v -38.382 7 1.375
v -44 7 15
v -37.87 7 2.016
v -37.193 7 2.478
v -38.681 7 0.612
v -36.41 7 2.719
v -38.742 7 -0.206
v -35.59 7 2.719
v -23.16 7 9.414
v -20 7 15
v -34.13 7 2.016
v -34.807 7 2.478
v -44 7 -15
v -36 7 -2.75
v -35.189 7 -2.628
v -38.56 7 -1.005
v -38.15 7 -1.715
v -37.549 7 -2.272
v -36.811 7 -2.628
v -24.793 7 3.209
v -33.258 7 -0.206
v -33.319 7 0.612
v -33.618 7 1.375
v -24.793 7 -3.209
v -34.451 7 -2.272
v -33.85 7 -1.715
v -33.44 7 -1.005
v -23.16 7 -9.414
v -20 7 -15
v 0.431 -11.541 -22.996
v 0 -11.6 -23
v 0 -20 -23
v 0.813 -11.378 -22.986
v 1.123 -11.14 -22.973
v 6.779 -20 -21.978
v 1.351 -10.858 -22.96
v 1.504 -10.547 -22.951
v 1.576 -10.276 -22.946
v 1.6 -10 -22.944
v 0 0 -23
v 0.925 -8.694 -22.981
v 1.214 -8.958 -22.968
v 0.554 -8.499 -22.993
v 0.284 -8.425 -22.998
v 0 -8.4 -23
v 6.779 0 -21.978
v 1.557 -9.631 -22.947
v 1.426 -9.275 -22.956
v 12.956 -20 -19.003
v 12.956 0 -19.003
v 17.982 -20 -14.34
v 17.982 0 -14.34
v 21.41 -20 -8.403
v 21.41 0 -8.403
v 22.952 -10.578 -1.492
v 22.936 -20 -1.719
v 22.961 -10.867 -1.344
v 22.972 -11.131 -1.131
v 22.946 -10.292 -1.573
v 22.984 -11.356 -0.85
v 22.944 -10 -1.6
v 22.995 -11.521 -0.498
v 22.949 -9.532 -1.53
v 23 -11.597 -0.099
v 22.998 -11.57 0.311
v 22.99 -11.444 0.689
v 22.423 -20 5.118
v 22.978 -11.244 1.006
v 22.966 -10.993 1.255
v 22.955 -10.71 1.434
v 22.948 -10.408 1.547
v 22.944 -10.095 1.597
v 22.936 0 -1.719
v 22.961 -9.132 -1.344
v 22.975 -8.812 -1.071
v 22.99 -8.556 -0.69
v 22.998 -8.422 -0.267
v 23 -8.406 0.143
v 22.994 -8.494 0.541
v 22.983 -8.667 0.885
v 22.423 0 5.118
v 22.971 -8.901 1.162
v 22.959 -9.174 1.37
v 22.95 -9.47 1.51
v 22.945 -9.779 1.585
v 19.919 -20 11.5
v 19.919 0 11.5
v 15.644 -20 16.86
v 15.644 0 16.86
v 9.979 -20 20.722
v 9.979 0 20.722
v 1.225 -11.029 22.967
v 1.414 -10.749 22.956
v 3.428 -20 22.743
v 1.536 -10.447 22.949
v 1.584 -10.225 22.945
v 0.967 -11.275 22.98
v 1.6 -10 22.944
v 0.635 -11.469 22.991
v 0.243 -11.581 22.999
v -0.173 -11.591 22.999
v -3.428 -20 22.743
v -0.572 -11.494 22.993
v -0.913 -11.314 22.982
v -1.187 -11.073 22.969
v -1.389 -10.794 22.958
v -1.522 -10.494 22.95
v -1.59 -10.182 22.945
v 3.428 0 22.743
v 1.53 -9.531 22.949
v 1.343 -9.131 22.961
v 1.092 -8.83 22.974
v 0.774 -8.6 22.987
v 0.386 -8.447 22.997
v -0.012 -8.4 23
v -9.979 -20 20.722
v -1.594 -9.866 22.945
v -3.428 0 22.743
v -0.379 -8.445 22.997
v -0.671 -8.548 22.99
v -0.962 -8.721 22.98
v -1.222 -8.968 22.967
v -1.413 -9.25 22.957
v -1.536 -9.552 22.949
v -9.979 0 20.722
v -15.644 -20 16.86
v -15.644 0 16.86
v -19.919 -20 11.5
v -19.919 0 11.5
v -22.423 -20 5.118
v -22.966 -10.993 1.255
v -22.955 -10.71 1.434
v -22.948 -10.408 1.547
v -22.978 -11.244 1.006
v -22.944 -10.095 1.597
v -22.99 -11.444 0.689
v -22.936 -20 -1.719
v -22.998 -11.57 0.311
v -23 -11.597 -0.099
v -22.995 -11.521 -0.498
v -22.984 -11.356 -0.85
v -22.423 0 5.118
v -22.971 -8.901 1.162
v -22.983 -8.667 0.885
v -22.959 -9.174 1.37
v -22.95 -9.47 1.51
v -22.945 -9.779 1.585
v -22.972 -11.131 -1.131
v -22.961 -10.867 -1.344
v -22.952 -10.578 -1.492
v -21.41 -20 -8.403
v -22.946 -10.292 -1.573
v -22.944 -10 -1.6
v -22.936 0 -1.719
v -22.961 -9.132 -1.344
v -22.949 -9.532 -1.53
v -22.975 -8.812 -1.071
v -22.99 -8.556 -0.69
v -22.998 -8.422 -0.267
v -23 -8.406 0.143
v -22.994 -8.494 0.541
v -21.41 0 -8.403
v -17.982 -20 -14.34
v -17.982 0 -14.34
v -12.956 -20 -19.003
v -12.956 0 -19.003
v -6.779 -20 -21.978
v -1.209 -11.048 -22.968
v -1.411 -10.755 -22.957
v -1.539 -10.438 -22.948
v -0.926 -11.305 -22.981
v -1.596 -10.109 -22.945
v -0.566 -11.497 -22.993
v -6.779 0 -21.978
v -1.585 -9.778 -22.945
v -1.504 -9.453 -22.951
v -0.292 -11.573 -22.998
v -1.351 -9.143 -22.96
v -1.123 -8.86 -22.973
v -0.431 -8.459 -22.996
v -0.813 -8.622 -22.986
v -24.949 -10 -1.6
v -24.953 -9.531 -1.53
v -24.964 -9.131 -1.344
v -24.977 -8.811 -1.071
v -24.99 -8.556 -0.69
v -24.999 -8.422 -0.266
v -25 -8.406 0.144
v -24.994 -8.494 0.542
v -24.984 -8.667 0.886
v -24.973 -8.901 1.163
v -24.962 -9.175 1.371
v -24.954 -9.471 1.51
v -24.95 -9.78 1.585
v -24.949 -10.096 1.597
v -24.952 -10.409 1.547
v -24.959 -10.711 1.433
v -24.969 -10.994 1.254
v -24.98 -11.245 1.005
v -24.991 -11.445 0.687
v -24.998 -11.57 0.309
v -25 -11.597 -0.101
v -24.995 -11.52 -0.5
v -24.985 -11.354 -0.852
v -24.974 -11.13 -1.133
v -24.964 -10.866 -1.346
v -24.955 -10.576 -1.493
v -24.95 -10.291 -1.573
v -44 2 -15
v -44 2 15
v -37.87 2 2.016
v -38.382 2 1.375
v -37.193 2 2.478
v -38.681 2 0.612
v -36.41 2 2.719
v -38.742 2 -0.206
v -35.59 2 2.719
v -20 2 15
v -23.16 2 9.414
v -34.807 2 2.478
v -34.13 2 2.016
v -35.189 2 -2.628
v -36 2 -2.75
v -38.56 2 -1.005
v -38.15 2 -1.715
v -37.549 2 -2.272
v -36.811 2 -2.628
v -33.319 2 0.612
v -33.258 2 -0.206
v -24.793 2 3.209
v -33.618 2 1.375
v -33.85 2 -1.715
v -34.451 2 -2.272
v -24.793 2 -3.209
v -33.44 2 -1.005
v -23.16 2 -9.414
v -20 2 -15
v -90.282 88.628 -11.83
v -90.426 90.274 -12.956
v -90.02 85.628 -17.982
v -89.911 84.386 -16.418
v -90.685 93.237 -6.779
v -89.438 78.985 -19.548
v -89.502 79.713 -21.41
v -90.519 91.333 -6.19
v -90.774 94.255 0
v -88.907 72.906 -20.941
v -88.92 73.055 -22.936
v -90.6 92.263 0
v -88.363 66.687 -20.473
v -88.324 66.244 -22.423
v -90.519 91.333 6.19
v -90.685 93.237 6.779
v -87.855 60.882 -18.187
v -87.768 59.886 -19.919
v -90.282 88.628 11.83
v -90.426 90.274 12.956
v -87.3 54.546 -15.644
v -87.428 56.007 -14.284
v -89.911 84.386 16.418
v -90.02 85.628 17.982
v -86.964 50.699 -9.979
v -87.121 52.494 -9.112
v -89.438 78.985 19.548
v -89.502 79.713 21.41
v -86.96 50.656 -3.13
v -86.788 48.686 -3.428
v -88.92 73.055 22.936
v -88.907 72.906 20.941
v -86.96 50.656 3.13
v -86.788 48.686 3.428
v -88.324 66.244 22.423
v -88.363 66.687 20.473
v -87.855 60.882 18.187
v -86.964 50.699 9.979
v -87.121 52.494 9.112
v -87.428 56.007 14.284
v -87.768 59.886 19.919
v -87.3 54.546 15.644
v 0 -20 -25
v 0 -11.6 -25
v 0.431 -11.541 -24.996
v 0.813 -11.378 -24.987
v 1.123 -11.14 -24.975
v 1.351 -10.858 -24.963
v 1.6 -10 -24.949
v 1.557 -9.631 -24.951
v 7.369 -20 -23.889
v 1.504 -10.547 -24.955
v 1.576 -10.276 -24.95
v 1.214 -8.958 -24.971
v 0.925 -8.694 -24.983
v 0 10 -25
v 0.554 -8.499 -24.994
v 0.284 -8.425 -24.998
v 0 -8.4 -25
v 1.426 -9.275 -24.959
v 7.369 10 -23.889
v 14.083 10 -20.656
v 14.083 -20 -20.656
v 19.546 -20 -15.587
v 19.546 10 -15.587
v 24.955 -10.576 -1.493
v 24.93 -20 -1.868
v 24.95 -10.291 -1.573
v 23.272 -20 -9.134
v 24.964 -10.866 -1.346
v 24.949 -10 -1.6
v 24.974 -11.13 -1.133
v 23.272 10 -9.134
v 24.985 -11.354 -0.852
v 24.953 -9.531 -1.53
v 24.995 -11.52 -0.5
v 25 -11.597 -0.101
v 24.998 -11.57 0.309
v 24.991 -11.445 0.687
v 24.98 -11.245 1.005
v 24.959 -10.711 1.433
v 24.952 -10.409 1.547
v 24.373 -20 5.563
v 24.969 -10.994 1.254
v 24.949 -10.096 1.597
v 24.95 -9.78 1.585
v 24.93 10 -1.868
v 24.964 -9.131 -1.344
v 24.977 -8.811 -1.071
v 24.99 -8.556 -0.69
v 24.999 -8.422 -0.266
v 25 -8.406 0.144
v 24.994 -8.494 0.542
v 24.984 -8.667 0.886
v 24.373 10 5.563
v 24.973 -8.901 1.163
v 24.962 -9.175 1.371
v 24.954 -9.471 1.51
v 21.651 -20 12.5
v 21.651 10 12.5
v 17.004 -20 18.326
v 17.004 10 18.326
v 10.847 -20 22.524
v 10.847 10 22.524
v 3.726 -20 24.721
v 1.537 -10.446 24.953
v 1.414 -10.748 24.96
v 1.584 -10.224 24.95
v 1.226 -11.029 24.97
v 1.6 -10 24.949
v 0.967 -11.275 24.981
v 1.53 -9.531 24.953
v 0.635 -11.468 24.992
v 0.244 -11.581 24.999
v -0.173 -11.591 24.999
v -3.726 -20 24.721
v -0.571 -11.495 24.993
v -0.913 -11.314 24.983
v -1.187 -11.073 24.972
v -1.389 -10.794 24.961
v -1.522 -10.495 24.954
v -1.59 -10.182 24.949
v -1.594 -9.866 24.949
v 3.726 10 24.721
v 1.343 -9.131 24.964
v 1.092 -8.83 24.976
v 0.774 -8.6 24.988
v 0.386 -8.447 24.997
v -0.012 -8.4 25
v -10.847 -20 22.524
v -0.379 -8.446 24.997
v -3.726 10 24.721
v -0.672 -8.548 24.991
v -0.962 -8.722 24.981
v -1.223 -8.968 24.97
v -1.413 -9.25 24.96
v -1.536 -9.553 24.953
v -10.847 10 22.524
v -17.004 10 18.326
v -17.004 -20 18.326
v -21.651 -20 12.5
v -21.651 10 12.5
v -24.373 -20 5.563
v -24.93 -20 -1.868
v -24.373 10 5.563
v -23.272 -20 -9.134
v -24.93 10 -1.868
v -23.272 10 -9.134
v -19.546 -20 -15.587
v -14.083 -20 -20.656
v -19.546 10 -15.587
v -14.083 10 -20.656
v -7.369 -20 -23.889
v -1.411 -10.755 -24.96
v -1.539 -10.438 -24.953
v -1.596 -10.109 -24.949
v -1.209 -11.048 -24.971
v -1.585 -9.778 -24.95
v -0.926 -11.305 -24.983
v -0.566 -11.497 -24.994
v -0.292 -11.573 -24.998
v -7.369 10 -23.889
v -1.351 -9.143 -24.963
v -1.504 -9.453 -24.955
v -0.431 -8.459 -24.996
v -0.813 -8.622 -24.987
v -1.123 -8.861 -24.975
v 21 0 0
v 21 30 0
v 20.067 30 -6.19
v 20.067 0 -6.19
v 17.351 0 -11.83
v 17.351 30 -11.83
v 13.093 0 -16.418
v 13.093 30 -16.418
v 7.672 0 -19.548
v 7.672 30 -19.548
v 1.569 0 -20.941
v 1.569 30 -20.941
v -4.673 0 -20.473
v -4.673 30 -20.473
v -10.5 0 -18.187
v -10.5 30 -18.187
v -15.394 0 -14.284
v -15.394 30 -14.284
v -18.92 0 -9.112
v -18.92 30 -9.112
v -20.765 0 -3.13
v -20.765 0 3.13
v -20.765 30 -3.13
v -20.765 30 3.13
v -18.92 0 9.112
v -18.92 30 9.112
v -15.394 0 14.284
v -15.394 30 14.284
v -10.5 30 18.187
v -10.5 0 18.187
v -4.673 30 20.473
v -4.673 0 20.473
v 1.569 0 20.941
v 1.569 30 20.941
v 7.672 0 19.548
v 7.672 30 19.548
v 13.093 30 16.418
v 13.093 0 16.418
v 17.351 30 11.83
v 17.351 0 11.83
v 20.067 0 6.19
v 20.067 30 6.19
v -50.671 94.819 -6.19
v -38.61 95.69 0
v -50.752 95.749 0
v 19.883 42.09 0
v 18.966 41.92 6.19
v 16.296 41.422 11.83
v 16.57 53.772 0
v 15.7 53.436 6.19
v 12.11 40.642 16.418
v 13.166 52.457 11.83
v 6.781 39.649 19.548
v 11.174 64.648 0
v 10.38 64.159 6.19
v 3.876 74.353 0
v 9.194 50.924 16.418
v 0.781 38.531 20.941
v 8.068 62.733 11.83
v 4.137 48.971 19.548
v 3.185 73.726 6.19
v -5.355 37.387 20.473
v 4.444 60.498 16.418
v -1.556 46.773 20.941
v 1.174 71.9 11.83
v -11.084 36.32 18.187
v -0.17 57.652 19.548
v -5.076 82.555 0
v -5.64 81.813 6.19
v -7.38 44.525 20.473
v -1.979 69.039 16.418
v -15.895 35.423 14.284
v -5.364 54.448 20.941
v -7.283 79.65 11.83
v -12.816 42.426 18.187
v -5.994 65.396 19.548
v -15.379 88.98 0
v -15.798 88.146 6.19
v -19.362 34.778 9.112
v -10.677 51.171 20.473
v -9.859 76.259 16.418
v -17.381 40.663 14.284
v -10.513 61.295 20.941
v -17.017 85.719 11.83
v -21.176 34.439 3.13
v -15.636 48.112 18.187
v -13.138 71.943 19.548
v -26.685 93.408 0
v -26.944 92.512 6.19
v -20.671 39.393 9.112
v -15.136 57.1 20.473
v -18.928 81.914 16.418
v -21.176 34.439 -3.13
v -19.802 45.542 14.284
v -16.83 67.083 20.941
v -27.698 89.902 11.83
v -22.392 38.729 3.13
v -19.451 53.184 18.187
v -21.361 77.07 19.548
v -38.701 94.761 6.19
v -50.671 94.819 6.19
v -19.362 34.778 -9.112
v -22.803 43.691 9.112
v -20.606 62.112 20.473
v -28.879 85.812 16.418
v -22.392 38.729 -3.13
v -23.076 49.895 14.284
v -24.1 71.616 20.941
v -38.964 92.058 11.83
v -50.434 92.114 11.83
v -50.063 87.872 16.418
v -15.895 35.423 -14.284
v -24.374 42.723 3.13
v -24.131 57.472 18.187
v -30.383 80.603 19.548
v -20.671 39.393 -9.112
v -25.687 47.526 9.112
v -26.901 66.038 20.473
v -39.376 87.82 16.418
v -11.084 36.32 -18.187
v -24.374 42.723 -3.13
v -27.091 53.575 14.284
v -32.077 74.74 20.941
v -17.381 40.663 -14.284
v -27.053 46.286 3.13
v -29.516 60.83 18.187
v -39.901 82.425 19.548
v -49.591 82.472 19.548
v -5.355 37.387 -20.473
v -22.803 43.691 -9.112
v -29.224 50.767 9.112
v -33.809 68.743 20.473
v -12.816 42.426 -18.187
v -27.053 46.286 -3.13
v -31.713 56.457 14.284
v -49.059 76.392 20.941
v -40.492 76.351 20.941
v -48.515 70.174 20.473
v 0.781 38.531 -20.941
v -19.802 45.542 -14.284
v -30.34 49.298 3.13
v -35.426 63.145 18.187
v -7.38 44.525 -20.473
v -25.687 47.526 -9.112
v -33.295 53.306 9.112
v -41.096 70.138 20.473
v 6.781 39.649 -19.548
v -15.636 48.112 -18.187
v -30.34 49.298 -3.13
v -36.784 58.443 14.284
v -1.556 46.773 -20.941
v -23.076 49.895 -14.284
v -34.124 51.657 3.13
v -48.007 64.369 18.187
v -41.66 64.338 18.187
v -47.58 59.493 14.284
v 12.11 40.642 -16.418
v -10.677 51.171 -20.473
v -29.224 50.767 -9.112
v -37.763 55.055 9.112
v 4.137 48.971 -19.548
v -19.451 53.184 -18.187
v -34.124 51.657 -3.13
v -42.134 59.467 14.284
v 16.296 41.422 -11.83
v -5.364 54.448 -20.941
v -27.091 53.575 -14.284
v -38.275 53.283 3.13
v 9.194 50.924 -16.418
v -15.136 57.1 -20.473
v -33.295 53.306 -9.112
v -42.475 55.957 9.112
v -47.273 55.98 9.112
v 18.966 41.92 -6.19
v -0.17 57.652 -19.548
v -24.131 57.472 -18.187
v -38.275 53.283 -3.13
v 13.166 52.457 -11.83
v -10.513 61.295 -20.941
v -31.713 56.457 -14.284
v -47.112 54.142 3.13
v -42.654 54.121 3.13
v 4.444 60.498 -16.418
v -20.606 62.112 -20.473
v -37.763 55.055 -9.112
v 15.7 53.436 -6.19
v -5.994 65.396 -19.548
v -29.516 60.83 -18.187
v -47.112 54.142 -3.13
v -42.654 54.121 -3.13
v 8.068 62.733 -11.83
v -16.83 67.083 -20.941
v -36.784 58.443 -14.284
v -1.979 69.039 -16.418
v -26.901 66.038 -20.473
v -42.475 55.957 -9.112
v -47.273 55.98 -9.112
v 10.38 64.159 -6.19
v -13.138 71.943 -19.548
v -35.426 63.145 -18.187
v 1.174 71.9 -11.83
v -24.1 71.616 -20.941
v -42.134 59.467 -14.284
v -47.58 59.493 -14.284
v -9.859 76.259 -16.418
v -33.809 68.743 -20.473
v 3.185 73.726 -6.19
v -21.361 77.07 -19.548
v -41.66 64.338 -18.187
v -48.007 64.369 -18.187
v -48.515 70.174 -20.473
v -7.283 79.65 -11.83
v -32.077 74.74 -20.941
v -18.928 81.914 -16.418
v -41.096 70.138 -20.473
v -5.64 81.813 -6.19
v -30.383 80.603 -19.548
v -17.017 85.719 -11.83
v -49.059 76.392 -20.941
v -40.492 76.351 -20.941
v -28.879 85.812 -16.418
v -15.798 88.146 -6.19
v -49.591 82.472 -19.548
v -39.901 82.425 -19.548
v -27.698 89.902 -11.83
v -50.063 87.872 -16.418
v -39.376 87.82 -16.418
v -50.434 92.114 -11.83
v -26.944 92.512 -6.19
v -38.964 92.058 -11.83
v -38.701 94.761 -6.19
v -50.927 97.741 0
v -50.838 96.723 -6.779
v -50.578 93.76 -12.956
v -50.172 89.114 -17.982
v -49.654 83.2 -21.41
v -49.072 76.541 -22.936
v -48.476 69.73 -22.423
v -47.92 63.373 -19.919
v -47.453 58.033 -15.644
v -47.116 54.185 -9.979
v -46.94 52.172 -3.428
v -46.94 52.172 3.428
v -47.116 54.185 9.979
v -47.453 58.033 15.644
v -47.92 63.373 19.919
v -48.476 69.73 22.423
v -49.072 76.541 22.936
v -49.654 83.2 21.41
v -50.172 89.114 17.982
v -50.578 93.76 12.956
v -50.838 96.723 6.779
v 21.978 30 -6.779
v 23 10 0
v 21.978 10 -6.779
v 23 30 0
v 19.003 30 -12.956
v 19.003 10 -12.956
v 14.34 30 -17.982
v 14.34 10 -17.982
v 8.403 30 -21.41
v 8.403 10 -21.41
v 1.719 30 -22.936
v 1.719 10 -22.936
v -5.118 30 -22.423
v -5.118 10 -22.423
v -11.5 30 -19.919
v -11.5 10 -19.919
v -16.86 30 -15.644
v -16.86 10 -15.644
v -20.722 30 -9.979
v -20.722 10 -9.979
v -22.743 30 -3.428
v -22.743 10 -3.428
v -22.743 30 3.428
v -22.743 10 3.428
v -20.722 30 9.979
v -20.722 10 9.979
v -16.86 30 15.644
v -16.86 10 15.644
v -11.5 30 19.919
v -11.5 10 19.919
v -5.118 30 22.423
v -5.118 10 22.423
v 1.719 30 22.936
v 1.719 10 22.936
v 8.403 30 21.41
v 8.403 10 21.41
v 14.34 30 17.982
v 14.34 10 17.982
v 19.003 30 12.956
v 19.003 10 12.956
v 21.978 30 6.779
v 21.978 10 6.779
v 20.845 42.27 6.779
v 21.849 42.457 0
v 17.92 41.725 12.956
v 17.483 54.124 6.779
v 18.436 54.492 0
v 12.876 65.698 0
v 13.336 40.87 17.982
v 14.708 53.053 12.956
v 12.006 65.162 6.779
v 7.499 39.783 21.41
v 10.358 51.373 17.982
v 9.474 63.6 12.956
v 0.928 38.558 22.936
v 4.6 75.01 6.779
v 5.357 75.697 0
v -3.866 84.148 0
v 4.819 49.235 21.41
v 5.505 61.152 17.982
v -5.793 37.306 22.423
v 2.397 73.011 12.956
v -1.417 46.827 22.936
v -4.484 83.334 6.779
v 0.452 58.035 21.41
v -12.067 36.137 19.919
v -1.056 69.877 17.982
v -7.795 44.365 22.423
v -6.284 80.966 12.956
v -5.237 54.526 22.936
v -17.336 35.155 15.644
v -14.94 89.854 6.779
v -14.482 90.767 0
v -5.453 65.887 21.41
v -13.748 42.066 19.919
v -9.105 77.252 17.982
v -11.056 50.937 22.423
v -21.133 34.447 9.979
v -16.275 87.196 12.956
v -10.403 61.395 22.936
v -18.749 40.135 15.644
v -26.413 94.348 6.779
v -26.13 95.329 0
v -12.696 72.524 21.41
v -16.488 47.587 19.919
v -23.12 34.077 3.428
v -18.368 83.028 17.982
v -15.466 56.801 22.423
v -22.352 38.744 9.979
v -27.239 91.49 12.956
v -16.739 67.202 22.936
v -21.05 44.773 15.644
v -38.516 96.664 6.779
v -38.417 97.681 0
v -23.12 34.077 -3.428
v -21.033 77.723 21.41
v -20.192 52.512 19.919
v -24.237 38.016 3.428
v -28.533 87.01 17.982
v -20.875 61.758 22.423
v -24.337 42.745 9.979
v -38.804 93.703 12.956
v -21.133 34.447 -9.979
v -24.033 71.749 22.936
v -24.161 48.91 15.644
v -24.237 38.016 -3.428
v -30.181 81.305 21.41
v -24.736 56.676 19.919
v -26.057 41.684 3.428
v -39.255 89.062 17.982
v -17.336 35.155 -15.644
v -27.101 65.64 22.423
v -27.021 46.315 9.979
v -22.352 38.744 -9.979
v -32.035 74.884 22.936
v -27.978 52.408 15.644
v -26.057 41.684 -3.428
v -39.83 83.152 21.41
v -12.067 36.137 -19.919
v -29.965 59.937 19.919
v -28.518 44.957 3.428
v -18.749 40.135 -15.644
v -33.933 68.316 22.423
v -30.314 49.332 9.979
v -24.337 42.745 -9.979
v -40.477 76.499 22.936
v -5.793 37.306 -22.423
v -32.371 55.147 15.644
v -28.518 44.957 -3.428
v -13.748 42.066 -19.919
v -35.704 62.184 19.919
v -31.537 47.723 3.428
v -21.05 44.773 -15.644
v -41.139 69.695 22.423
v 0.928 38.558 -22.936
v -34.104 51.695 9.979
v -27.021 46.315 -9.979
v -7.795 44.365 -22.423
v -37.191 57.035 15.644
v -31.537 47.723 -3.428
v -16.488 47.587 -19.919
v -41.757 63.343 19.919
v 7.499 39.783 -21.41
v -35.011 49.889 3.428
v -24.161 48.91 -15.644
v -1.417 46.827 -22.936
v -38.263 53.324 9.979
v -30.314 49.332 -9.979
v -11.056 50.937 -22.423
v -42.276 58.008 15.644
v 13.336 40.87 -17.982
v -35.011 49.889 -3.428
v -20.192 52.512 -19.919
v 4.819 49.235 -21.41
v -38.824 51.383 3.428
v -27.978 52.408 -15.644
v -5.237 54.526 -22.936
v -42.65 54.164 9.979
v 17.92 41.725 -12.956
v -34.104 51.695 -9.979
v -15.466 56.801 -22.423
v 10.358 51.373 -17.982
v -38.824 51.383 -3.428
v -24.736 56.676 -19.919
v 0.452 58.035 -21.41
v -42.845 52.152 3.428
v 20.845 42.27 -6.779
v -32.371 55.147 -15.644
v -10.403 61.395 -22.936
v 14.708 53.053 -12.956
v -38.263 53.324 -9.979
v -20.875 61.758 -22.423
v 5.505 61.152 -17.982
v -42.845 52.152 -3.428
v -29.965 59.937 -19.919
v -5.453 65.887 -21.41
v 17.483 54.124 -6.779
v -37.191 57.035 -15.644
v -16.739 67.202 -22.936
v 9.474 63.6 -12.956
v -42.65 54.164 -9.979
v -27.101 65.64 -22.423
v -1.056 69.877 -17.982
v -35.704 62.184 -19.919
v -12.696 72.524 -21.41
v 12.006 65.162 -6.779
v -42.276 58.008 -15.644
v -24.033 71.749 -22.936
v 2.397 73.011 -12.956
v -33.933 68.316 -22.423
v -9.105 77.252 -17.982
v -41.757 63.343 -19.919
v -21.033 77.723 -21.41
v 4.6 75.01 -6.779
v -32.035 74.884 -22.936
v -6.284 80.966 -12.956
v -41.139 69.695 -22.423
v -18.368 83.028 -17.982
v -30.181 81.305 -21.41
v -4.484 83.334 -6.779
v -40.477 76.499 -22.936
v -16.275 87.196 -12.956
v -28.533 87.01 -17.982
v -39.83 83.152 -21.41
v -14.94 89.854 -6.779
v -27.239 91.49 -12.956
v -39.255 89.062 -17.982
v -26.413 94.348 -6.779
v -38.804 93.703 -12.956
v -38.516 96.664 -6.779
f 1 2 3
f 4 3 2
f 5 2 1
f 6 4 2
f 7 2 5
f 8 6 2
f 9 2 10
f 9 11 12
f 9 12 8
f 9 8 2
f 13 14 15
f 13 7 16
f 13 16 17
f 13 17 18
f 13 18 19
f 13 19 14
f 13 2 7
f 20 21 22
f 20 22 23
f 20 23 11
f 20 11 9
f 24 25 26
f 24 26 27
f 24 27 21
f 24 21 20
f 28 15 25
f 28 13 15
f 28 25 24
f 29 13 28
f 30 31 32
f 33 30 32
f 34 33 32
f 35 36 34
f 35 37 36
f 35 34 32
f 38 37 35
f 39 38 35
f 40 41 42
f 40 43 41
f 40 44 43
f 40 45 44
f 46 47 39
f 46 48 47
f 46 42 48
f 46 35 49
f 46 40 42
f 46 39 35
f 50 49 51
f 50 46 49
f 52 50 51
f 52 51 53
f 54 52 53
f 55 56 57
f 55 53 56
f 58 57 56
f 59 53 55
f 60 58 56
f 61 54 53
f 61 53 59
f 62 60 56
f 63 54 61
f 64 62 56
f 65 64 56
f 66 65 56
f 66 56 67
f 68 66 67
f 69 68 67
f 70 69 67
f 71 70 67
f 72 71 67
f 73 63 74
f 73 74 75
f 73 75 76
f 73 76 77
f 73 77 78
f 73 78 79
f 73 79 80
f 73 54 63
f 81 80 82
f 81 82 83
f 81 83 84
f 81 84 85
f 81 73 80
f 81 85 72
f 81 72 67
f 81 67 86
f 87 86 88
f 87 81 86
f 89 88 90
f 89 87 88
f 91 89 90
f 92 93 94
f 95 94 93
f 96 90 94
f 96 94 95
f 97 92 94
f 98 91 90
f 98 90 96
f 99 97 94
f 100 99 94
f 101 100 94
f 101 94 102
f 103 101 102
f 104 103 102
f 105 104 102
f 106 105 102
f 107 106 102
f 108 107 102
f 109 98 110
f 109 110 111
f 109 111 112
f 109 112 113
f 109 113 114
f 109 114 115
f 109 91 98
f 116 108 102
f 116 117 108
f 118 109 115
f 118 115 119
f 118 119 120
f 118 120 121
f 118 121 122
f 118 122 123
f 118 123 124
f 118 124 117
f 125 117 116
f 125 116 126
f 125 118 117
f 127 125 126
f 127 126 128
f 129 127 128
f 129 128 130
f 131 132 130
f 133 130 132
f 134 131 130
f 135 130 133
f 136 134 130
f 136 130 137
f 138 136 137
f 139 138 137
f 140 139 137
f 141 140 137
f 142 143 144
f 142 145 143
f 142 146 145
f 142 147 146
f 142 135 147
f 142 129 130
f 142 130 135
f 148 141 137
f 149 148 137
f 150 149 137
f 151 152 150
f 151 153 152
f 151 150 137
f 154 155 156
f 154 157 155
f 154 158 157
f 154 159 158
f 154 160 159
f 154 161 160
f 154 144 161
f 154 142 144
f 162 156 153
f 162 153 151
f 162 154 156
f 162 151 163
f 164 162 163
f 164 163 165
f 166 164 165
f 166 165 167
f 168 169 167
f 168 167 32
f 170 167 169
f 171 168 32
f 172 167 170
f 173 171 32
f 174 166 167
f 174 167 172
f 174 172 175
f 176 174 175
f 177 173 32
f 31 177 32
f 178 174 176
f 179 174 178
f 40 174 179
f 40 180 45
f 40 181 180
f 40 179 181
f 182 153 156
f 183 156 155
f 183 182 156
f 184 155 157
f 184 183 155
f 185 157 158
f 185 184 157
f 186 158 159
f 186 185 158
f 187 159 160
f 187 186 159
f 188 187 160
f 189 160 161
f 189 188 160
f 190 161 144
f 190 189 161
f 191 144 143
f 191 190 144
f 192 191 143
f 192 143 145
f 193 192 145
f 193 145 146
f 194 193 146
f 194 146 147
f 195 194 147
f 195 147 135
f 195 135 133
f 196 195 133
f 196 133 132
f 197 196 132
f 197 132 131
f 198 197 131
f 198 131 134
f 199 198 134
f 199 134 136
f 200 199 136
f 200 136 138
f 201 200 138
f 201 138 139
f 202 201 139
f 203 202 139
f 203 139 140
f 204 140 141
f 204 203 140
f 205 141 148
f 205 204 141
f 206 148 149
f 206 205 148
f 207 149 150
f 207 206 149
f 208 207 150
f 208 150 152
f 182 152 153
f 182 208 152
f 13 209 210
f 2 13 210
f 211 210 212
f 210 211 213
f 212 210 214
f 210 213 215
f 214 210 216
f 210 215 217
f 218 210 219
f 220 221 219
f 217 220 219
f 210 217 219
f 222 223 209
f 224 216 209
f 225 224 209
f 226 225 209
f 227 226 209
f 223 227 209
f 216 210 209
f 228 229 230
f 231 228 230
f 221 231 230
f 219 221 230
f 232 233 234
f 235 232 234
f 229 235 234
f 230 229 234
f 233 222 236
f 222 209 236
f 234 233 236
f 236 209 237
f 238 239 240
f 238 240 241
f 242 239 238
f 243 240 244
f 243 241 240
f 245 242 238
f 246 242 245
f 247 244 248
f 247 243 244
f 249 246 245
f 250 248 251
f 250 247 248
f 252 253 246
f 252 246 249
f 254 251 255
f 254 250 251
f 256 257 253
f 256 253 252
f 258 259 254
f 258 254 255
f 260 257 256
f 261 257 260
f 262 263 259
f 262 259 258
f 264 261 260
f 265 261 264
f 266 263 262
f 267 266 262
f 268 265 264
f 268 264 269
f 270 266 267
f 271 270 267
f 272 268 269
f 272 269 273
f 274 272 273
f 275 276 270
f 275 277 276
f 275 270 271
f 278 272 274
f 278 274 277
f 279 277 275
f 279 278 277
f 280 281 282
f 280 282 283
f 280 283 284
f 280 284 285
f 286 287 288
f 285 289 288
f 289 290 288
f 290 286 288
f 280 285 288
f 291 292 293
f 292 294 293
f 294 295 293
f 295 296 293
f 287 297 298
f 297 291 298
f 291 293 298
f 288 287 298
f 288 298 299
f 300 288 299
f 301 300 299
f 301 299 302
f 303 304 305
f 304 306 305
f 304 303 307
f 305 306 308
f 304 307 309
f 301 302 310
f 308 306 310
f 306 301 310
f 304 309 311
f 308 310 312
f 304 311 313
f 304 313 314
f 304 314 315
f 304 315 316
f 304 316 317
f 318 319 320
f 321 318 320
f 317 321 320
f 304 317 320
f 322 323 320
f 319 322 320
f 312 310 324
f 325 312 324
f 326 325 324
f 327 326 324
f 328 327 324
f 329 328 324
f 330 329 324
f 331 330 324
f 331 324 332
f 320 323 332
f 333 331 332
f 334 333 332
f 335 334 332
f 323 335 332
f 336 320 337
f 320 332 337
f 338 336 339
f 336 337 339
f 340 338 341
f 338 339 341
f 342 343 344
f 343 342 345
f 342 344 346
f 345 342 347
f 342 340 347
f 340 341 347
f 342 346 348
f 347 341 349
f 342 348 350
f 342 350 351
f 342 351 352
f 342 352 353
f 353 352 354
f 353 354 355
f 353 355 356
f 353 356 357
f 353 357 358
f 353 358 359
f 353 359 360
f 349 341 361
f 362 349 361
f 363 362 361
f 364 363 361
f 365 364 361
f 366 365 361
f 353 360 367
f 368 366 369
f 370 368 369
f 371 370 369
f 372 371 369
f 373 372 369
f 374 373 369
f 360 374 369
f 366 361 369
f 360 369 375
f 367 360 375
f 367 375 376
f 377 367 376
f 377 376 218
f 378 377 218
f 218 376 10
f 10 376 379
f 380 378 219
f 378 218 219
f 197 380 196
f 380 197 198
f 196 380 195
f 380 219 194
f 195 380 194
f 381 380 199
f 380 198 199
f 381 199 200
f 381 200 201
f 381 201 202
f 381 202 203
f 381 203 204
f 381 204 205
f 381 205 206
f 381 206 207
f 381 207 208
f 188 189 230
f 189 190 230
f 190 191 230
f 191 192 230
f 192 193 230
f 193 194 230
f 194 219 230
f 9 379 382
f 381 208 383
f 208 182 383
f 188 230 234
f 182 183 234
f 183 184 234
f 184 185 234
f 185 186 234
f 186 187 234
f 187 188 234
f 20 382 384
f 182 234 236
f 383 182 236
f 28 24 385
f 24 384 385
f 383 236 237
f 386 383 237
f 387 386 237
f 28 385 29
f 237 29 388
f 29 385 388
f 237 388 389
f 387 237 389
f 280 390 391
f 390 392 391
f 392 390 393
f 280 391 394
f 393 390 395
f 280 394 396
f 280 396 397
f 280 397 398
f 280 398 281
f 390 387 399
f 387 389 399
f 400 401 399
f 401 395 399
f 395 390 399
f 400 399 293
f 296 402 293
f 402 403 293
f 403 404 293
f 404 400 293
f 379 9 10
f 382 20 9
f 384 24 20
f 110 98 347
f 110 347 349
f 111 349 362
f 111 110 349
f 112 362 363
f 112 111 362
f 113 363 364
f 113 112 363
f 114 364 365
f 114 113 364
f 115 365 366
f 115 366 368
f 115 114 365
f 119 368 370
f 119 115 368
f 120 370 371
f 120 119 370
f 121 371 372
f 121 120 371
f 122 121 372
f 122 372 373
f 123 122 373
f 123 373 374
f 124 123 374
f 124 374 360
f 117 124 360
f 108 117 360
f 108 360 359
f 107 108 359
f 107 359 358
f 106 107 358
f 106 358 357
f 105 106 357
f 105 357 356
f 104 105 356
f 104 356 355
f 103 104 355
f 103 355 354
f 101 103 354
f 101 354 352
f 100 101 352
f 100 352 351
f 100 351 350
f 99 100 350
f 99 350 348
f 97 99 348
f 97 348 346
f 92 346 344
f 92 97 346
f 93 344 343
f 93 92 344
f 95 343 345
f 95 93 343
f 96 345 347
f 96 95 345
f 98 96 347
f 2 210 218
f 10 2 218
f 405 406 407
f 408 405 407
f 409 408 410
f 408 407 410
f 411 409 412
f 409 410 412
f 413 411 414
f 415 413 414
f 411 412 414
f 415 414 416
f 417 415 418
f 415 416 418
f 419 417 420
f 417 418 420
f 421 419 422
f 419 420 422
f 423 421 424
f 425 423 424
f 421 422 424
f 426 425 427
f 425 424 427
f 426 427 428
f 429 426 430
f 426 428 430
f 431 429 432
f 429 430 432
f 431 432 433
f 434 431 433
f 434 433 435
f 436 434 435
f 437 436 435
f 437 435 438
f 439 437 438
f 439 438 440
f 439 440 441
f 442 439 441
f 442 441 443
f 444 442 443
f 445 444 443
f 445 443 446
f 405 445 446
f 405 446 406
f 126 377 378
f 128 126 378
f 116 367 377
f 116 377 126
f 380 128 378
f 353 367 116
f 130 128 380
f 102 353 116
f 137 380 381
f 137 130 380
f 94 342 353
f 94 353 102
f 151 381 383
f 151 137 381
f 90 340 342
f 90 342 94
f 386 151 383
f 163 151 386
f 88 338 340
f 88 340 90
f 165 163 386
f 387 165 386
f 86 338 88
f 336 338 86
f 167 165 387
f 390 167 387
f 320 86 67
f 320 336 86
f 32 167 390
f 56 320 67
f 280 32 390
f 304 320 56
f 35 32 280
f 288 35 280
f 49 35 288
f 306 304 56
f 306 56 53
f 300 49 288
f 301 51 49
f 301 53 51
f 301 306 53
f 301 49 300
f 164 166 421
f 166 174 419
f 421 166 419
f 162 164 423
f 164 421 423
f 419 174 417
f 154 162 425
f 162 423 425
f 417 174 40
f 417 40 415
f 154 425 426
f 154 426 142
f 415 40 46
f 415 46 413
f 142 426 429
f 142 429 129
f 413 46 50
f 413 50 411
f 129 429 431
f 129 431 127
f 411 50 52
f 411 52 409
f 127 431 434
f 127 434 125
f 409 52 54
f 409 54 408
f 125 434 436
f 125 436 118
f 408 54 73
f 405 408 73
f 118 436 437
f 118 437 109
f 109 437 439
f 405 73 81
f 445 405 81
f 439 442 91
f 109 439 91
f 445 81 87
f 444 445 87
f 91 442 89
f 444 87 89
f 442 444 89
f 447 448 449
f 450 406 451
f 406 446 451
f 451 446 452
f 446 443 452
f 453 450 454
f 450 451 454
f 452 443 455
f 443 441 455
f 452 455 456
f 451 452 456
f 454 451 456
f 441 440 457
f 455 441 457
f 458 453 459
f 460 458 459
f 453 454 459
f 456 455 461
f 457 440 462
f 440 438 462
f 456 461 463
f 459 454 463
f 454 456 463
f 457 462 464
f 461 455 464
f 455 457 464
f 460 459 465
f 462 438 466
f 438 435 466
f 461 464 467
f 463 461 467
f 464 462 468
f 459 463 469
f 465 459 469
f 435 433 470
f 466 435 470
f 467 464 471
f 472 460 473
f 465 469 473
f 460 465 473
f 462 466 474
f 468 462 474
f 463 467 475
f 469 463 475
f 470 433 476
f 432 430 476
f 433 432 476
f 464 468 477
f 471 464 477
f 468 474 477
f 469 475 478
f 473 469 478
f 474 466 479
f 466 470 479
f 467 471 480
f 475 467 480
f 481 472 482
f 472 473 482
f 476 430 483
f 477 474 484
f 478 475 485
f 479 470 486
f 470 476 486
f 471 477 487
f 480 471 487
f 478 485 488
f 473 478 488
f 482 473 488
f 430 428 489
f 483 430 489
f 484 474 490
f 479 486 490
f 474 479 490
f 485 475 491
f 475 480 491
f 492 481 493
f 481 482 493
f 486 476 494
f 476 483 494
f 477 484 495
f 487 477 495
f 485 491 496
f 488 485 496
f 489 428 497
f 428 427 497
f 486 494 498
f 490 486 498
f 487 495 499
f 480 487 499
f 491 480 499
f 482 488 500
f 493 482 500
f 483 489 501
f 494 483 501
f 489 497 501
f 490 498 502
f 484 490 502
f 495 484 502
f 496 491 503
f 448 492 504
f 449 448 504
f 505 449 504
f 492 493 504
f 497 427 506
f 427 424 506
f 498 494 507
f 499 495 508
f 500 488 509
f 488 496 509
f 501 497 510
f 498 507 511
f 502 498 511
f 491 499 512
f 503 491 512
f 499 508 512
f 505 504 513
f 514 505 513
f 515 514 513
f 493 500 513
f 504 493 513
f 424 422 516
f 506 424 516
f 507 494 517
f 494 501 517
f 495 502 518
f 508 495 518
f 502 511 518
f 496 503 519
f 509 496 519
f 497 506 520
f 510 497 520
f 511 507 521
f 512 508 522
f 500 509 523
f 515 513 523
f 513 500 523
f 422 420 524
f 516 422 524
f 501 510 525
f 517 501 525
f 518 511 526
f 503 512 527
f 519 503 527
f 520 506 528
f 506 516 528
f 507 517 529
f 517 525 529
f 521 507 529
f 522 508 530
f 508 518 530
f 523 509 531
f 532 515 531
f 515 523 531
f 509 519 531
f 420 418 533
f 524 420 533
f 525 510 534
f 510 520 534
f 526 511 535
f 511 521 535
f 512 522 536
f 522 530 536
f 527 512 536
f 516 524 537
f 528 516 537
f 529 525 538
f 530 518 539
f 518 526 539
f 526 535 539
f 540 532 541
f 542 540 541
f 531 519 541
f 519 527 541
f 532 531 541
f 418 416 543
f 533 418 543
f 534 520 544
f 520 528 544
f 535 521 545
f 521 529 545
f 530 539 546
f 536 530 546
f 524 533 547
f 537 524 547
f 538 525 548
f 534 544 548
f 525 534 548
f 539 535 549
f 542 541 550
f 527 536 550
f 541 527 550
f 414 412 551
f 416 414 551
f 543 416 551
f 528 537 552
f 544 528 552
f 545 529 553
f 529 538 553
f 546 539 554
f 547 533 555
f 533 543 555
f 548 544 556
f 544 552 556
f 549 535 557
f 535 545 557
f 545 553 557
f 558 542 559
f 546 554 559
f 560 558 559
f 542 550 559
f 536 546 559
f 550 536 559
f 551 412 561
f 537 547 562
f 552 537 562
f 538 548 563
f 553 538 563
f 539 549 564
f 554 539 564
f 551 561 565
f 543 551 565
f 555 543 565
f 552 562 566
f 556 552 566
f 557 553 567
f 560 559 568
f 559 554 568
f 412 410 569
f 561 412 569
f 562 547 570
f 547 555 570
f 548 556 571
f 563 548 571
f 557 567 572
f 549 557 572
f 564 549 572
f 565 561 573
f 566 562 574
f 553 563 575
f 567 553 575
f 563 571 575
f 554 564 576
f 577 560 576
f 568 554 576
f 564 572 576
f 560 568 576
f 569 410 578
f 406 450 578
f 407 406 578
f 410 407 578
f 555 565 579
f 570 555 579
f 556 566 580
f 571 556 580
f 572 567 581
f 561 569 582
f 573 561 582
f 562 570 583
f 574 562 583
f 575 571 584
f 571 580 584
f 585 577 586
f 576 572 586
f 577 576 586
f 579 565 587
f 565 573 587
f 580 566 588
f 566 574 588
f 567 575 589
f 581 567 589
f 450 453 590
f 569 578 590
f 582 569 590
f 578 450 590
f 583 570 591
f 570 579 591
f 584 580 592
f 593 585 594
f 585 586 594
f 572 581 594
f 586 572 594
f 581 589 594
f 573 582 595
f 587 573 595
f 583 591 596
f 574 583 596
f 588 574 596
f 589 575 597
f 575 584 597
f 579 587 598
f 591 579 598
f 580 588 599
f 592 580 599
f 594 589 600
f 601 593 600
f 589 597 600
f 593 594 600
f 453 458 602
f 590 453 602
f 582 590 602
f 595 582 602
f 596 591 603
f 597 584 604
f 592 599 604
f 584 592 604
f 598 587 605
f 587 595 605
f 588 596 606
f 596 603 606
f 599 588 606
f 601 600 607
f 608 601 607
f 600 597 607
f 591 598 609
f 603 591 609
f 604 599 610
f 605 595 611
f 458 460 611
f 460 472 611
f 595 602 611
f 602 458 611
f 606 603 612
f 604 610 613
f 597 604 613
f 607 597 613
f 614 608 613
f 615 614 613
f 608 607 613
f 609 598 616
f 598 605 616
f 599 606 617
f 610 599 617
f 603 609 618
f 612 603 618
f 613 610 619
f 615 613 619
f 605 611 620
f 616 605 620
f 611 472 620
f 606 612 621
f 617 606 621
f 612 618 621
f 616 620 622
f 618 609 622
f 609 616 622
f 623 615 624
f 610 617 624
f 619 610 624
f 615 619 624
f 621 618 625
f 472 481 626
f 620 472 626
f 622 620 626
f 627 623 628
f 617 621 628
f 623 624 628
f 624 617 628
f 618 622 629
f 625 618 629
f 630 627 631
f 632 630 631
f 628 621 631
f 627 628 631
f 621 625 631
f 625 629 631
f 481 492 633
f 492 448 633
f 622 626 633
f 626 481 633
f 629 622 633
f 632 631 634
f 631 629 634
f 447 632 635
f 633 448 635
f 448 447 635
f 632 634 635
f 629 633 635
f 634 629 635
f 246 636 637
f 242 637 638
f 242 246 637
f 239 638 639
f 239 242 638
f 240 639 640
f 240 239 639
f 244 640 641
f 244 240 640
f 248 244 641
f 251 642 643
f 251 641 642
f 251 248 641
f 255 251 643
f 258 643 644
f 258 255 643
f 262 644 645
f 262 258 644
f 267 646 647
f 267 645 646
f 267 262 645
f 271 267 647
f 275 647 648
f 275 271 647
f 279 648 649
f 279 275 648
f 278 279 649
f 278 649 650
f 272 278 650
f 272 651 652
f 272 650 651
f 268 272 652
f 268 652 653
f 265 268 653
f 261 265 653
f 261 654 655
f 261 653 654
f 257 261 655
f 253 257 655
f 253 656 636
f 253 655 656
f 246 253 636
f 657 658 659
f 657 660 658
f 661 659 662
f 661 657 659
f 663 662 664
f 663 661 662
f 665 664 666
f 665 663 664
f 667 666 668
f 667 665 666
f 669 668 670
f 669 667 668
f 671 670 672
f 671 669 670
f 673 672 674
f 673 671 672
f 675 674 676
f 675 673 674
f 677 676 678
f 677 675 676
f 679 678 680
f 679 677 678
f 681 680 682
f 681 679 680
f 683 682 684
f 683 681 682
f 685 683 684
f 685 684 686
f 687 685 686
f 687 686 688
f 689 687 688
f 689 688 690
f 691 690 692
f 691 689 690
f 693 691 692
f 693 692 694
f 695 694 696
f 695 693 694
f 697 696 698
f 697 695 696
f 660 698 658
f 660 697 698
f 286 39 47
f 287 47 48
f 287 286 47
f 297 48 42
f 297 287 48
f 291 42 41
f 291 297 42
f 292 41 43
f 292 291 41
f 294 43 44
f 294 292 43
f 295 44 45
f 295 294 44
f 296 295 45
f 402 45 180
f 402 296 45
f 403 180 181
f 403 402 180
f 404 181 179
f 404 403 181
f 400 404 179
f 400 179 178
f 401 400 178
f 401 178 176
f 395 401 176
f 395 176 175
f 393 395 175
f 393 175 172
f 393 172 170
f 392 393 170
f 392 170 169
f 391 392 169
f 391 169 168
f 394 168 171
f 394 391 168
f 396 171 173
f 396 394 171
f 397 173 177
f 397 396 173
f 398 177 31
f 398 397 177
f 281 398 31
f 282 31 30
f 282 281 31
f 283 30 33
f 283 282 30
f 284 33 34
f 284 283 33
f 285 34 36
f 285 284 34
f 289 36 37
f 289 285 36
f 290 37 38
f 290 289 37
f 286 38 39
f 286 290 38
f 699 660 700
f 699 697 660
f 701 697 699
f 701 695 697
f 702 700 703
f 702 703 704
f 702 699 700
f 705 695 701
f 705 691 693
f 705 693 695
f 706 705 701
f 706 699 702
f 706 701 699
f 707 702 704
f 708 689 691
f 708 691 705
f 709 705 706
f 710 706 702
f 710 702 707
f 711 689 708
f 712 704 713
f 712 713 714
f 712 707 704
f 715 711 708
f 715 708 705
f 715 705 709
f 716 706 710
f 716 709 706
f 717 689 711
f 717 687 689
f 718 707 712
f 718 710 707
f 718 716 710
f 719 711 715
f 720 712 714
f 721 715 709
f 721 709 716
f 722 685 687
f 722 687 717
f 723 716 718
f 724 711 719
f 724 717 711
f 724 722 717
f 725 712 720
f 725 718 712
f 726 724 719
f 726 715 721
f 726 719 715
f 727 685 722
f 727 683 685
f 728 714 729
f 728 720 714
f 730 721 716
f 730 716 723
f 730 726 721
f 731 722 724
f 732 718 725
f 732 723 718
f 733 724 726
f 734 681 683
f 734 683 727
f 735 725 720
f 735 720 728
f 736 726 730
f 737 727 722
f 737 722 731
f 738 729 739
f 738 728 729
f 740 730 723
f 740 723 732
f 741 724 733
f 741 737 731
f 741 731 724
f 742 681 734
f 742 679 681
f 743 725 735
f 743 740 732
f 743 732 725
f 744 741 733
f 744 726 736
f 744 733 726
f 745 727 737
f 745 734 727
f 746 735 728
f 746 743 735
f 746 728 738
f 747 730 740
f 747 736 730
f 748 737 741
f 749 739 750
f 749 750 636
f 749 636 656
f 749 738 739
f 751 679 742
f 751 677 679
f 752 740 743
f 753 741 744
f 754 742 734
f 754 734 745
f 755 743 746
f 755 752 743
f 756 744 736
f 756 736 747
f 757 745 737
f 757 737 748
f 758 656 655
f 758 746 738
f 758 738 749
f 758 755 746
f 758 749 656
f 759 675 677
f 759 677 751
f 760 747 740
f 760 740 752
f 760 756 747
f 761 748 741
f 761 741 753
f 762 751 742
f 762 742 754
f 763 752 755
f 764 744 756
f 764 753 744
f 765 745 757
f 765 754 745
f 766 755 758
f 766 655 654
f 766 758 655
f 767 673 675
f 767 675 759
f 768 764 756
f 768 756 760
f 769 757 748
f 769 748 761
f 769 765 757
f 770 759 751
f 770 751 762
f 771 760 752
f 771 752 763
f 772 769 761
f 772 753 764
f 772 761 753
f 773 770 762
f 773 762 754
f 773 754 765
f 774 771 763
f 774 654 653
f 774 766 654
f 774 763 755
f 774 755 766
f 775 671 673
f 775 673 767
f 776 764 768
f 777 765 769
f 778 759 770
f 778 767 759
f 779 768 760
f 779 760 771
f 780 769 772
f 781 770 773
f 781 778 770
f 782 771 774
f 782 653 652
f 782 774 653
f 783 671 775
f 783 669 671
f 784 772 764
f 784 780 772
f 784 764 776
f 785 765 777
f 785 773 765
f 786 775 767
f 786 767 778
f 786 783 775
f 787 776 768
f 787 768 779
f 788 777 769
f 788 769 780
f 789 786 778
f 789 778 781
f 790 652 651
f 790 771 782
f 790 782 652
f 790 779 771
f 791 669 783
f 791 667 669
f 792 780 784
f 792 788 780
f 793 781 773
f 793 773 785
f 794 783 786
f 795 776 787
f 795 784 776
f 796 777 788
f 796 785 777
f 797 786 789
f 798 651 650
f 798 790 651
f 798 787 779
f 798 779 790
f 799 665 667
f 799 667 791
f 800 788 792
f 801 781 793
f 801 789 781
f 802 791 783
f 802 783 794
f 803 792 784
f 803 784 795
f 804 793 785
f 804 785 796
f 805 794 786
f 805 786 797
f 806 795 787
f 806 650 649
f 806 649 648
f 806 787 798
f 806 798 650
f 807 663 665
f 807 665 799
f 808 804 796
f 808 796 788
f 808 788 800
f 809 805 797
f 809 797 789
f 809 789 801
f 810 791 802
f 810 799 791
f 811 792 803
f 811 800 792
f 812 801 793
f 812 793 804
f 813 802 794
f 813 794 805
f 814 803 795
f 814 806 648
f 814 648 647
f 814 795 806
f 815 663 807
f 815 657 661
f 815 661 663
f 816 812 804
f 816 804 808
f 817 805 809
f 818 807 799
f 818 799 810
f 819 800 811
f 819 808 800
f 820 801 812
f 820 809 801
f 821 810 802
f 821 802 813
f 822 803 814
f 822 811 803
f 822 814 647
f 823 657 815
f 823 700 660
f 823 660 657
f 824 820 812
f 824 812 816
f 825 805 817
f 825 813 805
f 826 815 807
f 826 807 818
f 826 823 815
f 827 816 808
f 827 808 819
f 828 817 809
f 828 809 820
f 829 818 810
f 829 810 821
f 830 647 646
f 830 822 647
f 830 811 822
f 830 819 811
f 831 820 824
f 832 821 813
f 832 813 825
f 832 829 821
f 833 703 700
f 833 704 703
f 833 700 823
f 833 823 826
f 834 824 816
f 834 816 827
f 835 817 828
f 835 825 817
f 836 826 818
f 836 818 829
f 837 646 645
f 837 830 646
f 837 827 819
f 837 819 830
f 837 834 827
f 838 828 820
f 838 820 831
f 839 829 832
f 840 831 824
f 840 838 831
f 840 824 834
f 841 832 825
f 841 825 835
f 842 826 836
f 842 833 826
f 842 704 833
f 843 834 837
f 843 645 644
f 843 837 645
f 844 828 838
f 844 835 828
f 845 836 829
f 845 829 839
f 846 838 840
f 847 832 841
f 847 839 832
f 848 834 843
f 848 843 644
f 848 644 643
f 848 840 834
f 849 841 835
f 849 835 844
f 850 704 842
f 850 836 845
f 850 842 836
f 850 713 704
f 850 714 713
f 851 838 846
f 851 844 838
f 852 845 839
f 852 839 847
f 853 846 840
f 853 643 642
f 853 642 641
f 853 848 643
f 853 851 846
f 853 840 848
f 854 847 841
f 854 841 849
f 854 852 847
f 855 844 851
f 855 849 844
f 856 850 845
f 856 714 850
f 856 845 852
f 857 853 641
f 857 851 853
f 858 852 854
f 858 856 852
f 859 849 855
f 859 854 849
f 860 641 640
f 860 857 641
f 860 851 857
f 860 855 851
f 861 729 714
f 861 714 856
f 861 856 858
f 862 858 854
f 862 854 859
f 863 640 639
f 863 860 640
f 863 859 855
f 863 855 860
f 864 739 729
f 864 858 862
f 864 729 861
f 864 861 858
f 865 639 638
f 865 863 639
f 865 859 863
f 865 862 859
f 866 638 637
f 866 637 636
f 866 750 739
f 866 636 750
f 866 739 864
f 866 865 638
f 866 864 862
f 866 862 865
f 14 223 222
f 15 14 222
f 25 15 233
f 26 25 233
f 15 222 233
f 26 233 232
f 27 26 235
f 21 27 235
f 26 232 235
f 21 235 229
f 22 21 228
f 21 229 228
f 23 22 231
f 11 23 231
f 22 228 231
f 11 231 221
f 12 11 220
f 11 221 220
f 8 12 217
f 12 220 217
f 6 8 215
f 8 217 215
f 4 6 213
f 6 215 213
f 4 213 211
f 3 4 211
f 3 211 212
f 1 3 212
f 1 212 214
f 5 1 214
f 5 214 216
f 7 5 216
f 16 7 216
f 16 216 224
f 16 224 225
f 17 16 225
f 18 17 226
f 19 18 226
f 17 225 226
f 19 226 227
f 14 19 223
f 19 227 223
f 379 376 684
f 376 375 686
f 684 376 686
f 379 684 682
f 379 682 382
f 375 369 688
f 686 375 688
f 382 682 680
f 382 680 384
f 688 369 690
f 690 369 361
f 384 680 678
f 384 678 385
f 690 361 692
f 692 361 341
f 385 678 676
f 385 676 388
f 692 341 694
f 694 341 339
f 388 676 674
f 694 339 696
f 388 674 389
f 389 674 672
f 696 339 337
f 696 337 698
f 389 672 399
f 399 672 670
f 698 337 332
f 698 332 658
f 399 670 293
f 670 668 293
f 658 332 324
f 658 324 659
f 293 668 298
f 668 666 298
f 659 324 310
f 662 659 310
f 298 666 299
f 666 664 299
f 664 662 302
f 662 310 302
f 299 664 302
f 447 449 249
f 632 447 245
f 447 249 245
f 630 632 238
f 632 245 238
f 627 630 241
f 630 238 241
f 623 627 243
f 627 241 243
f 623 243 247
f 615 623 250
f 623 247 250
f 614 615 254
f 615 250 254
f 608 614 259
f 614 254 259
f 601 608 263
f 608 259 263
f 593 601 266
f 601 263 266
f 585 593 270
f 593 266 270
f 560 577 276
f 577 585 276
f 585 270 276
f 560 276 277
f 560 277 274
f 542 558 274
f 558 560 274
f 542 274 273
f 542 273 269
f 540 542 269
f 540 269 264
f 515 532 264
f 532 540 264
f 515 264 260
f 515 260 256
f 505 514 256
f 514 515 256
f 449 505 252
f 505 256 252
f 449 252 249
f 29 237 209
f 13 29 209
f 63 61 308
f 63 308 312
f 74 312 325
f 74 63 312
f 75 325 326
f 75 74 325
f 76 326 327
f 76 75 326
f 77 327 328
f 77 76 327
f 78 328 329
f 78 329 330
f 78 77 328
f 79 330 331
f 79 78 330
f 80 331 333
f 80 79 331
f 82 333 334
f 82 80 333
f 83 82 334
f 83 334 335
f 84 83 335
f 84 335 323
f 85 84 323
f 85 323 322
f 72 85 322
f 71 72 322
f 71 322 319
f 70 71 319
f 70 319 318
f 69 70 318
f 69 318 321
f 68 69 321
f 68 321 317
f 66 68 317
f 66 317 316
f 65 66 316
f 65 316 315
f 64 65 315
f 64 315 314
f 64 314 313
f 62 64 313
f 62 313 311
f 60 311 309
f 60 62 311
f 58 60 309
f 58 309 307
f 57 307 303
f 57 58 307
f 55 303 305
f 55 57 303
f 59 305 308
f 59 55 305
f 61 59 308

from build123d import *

# Parameters (mm, degrees)
SKETCH_1_R               = 23
SKETCH_1_R_2             = 21
EXTRUDE_1_DEPTH          = 20
EXTRUDE_1_DEPTH_BACK     = 10
SKETCH_3_R               = 25
SKETCH_3_R_2             = 23
SKETCH_5_R               = 2.75
EXTRUDE_3_DEPTH          = 5
CUT_EXTRUDE_1_DEPTH      = 136.900654152
CUT_EXTRUDE_1_DEPTH_BACK = 136.900654152
SKETCH_6_R               = 1.6
CUT_EXTRUDE_2_DEPTH      = 136.900654171
CUT_EXTRUDE_2_DEPTH_BACK = 136.900654171
SKETCH_7_R               = 1.6


with BuildPart() as part:
    # 扫描1: sweep along a path in 草图2
    with BuildLine(Plane.XY) as sweep_1_path:
        Line((0, 0), (0, 30))
        ThreePointArc((0, 30), (-14.598440657, 63.177480156), (-48.922008424, 74.828761414))
        Line((-48.922008424, 74.828761414), (-88.769796347, 71.342531704))
    # 草图1 → 扫描1 (sweep)
    with BuildSketch(Plane(origin=(0, 0, 0), x_dir=(1, 0, 0), z_dir=(0, 1, 0))):
        Circle(SKETCH_1_R)
        Circle(SKETCH_1_R_2, mode=Mode.SUBTRACT)
    sweep(path=sweep_1_path.line)


with BuildPart() as body_2:
    # 草图3 → 凸台-拉伸1 (new, two sides: drawn at the far end of the back side and taken through both)
    with BuildSketch(Plane(origin=(0, 0, 58.765701135), x_dir=(1, 0, 0), z_dir=(0, -1, 0)).offset(-EXTRUDE_1_DEPTH_BACK)):
        with Locations(Location((0, -58.765701135, 0), (0, 0, 270))):
            Circle(SKETCH_3_R)
        with Locations(Location((0, -58.765701135, 0), (0, 0, 270))):
            Circle(SKETCH_3_R_2, mode=Mode.SUBTRACT)
    extrude(amount=EXTRUDE_1_DEPTH + EXTRUDE_1_DEPTH_BACK)


    add(part.part)  # 凸台-拉伸3 merges part
    # 草图5 → 凸台-拉伸3 (add)
    with BuildSketch(Plane(origin=(0, 2, 0), x_dir=(-1, 0, 0), z_dir=(0, -1, 0))):
        with BuildLine():
            Line((20, 15), (44, 15))
            Line((44, 15), (44, -15))
            Line((44, -15), (20, -15))
            ThreePointArc((20, -15), (25, 0), (20, 15))
        make_face()
        with Locations(Location((36, 0, 0), (0, 0, 90))):
            Circle(SKETCH_5_R, mode=Mode.SUBTRACT)
    extrude(amount=-EXTRUDE_3_DEPTH)

    # 草图6 → 切除-拉伸1 (cut, two sides: drawn at the far end of the back side and taken through both)
    with BuildSketch(Plane(origin=(0, 0, 0), x_dir=(0, 0, -1), z_dir=(1, 0, 0)).offset(-CUT_EXTRUDE_1_DEPTH_BACK)):
        with Locations((0, -10)):
            Circle(SKETCH_6_R)
    extrude(amount=CUT_EXTRUDE_1_DEPTH + CUT_EXTRUDE_1_DEPTH_BACK, mode=Mode.SUBTRACT)

    # 草图7 → 切除-拉伸2 (cut, two sides: drawn at the far end of the back side and taken through both)
    with BuildSketch(Plane.XY.offset(-CUT_EXTRUDE_2_DEPTH_BACK)):
        with Locations((0, -10)):
            Circle(SKETCH_7_R)
    extrude(amount=CUT_EXTRUDE_2_DEPTH + CUT_EXTRUDE_2_DEPTH_BACK, mode=Mode.SUBTRACT)


solid = body_2.part
